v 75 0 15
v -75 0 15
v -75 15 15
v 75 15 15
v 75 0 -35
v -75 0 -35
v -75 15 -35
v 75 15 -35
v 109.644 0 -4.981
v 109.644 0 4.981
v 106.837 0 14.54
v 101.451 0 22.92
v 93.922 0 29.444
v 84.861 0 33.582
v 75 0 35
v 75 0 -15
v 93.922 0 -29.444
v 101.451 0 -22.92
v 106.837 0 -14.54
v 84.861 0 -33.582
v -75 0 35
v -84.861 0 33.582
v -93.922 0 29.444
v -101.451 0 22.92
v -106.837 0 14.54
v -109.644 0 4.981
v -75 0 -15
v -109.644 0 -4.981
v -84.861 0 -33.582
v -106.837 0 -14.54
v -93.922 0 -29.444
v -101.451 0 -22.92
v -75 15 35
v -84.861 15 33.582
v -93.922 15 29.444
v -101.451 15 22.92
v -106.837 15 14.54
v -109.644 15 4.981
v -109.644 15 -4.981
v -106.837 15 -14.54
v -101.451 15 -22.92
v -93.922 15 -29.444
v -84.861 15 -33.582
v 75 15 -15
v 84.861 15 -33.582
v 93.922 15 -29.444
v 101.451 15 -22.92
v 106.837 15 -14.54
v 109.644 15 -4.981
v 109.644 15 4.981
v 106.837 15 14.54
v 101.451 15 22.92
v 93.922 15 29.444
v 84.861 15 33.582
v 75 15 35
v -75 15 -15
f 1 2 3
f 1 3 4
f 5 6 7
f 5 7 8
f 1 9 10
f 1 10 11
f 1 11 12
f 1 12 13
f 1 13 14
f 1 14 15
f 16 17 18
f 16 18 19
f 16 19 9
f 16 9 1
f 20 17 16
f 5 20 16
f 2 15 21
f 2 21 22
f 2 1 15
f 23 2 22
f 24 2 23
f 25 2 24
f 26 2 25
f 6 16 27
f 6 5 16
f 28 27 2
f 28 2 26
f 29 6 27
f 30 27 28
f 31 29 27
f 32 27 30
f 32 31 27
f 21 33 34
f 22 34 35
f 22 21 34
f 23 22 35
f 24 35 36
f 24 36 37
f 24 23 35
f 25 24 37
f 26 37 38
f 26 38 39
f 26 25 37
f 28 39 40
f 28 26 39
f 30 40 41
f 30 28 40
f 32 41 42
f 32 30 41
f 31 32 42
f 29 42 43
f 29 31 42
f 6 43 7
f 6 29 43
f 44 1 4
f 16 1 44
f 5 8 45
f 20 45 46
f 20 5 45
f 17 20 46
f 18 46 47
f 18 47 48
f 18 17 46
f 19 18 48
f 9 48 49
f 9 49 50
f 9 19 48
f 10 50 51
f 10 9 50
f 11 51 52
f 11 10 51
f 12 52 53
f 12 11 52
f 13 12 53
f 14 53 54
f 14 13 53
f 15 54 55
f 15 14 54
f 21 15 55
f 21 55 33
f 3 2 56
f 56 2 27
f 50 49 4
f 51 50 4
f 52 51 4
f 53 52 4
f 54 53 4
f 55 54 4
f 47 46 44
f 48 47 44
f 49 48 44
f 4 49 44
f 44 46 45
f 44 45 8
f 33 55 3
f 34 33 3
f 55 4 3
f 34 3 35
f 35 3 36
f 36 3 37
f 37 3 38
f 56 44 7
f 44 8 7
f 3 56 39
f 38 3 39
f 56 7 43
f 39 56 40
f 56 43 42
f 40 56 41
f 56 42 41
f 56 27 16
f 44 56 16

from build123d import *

# Parameters (mm, degrees)
SKETCH1_W           = 150
SKETCH1_H           = 30
BOSS_EXTRUDE1_DEPTH = 15


with BuildPart() as part:
    # Sketch1 → Boss-Extrude1 (new body)
    with BuildSketch(Plane(origin=(0, 0, 0), x_dir=(1, 0, 0), z_dir=(0, 1, 0))):
        with BuildLine():
            Line((-75, 35), (75, 35))
            ThreePointArc((75, 35), (110, 0), (75, -35))
            Line((75, -35), (-75, -35))
            ThreePointArc((-75, -35), (-110, 0), (-75, 35))
        make_face()
        Rectangle(SKETCH1_W, SKETCH1_H, mode=Mode.SUBTRACT)
    extrude(amount=BOSS_EXTRUDE1_DEPTH)


solid = part.part
